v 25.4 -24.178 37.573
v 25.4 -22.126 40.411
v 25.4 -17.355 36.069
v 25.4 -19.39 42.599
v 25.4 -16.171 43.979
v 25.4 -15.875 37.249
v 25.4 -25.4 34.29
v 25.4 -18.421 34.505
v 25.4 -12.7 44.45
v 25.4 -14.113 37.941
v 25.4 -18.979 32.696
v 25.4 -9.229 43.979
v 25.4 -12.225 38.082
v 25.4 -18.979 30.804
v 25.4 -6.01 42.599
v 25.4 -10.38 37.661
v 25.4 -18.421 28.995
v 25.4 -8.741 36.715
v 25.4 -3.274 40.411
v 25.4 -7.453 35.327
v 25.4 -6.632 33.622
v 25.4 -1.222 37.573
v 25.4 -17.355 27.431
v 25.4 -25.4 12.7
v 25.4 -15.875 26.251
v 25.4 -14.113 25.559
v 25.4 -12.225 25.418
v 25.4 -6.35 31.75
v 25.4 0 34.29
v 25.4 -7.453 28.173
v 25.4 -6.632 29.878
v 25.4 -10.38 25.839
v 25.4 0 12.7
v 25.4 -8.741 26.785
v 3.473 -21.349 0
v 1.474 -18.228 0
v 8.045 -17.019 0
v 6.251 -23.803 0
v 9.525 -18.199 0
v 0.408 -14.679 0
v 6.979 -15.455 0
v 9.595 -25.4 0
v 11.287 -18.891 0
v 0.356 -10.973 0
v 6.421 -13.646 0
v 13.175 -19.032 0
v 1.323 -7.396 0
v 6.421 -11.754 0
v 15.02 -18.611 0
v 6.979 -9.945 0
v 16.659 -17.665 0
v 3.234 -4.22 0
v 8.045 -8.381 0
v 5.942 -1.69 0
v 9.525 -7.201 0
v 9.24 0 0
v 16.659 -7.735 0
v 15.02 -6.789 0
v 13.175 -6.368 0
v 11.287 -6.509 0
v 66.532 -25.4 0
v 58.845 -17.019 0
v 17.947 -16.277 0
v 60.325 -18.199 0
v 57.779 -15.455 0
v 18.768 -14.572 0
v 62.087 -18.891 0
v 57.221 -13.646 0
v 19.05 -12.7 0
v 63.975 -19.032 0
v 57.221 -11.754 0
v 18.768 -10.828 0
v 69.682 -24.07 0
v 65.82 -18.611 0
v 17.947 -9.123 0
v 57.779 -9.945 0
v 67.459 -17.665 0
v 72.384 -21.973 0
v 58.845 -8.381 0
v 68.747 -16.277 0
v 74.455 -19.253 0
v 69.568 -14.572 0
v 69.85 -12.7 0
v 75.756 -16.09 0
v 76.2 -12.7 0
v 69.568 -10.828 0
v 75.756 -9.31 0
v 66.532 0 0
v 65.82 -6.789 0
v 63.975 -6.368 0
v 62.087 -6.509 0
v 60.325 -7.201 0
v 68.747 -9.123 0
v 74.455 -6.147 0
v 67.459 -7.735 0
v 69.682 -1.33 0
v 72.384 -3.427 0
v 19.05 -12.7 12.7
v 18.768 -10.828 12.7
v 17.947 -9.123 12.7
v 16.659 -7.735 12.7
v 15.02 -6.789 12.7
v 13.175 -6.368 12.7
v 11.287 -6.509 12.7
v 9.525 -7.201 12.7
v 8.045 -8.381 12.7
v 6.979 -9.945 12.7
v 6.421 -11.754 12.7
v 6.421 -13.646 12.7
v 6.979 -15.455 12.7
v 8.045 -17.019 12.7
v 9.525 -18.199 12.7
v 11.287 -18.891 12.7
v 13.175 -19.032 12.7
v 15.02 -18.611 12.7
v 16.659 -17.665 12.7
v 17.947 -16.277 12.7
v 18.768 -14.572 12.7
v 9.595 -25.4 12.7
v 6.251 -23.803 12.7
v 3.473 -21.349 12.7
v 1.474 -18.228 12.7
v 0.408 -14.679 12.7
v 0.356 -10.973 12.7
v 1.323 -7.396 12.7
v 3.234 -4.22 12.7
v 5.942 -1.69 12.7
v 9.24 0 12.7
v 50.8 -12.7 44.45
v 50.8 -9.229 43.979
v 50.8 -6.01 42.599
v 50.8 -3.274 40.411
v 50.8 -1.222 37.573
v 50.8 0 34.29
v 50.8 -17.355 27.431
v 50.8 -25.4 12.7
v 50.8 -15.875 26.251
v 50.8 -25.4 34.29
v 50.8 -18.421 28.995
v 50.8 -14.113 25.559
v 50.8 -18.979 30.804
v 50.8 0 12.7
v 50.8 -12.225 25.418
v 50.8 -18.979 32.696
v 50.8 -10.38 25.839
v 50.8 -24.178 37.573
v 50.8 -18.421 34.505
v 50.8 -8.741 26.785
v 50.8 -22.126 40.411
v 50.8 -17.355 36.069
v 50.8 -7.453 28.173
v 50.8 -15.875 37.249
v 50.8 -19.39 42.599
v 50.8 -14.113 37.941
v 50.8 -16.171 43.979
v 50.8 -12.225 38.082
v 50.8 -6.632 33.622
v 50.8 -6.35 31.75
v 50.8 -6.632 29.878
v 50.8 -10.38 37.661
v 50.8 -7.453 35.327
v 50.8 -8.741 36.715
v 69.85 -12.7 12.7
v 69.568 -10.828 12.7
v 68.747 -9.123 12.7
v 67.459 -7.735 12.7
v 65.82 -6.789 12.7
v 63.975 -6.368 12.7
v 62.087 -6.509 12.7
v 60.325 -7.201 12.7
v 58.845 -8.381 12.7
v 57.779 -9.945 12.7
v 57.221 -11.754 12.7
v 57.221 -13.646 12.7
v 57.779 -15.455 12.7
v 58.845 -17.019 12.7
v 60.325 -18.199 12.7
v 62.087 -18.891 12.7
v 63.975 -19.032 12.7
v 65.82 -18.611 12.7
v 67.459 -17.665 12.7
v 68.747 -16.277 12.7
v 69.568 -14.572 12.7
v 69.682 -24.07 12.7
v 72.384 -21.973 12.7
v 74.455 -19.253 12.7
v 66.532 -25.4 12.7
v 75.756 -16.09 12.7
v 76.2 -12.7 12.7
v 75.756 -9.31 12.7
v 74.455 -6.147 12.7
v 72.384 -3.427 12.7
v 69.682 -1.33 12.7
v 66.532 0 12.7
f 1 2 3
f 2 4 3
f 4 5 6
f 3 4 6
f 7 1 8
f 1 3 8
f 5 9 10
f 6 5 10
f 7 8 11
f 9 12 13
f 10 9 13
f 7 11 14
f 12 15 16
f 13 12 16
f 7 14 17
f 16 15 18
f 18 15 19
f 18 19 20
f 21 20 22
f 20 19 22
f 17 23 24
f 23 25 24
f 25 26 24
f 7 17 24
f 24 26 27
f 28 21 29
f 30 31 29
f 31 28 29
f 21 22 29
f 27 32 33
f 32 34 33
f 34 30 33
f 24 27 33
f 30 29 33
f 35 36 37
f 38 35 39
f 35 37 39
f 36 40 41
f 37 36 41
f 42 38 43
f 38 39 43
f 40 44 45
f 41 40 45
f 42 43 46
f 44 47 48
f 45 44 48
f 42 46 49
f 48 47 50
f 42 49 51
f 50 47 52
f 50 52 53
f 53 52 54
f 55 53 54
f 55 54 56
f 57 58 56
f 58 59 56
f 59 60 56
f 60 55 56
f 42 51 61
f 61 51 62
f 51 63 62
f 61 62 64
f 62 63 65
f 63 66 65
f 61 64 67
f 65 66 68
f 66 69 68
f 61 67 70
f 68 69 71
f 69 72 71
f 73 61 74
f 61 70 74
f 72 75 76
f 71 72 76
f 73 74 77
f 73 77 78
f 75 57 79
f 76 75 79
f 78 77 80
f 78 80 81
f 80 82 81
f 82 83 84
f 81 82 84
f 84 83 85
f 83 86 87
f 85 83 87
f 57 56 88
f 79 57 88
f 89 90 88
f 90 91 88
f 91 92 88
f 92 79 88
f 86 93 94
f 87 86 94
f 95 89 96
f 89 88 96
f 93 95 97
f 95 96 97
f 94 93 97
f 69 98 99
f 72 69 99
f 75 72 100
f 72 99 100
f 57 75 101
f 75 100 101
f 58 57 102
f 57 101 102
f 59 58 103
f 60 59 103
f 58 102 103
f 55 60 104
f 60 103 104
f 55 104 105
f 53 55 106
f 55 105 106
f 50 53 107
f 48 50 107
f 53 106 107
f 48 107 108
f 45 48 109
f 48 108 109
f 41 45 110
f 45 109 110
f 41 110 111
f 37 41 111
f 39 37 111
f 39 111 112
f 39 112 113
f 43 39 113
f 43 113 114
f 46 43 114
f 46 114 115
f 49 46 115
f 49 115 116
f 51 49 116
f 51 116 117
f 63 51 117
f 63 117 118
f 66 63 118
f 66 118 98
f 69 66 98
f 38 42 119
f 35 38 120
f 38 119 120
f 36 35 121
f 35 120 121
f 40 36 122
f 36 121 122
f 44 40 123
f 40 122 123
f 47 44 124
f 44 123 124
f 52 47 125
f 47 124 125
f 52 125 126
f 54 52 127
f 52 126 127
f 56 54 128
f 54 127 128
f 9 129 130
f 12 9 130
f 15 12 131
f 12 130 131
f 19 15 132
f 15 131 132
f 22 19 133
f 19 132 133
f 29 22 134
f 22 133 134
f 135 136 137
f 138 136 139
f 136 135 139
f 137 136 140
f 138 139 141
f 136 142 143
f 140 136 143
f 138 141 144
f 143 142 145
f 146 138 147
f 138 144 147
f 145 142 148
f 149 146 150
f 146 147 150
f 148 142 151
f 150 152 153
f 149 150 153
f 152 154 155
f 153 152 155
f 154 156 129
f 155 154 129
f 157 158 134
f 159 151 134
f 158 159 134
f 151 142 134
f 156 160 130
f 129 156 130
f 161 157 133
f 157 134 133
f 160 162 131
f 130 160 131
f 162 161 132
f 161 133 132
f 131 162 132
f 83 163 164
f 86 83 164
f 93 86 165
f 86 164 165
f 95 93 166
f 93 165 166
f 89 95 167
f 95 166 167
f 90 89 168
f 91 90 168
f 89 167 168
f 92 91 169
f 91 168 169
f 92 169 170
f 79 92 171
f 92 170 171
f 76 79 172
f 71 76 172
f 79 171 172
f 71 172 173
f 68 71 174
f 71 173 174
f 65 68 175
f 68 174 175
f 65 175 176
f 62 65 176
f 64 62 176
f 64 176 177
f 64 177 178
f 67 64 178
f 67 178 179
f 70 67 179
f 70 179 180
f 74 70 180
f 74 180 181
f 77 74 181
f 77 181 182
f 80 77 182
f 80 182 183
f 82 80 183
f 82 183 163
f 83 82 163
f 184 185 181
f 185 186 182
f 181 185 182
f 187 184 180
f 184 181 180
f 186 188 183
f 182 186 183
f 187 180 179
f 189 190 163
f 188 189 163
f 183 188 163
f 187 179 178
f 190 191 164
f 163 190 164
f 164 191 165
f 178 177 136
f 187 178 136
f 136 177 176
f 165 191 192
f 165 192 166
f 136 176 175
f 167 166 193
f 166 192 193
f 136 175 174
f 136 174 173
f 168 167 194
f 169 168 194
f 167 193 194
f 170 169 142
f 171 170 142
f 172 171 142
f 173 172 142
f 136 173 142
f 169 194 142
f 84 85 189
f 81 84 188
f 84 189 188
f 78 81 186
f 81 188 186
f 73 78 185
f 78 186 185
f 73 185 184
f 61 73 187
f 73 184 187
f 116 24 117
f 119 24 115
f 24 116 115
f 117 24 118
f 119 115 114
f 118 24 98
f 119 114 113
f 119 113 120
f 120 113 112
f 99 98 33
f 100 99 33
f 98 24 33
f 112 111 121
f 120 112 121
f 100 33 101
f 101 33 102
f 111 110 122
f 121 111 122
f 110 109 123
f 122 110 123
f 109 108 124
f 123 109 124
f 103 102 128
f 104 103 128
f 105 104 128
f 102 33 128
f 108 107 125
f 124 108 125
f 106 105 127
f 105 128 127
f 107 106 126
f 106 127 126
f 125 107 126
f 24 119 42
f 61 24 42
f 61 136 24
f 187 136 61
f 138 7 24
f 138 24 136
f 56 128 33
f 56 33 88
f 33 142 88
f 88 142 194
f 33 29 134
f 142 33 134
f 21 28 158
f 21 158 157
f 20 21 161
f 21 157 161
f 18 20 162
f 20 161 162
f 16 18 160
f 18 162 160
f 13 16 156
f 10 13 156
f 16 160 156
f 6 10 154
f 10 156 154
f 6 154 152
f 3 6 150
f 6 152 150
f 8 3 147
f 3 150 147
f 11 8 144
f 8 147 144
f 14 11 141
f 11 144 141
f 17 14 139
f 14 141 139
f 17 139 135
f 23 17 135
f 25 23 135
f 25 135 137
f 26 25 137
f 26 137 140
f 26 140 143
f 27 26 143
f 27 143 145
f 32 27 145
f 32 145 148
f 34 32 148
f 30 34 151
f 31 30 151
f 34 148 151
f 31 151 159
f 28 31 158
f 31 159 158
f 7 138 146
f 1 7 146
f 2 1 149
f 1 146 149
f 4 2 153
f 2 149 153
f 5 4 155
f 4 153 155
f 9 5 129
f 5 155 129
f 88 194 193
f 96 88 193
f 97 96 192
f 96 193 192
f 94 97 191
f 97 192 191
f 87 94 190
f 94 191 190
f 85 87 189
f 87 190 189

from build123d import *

# Parameters (mm, degrees)
F1_DEPTH  = 25.4
F2_R      = 6.35
F3_DEPTH  = 25.4
F5_DEPTH  = 25.4
F6_R      = 6.35
F7_DEPTH  = 25.4
F8_R      = 6.35
F9_DEPTH  = 25.4
F11_DEPTH = 25.4
F13_DEPTH = 25.4


with BuildPart() as f1:
    # F0 (on Front) → F1 (new body)
    with BuildSketch(Plane.XZ):
        Polygon((0, 12.7), (0, 0), (76.2, 0), (76.2, 12.7), (50.8, 12.7), (50.8, 44.45), (25.4, 44.45), (25.4, 12.7), align=None)
    extrude(amount=F1_DEPTH)

    # F2 (on face) → F3 (cut)
    with BuildSketch(Plane.YZ.offset(50.8)):
        with Locations((-12.7, 31.75)):
            Circle(F2_R)
    extrude(amount=-F3_DEPTH, mode=Mode.SUBTRACT)

    # F4 (on face) → F5 (cut)
    with BuildSketch(Plane.YZ.offset(50.8)):
        with BuildLine():
            ThreePointArc((-25.4, 34.29), (-20.8319677815, 41.5974597269), (-12.7, 44.45))
            Line((-12.7, 44.45), (-25.4, 44.45))
            Line((-25.4, 44.45), (-25.4, 34.29))
        make_face()
        with BuildLine():
            ThreePointArc((-12.7, 44.45), (-4.5680322185, 41.5974597269), (0, 34.29))
            Line((0, 34.29), (0, 44.45))
            Line((0, 44.45), (-12.7, 44.45))
        make_face()
    extrude(amount=-F5_DEPTH, mode=Mode.SUBTRACT)

    # F6 (on face) → F7 (cut)
    with BuildSketch(Plane.XY.offset(12.7)):
        with Locations((63.5, -12.7)):
            Circle(F6_R)
    extrude(amount=-F7_DEPTH, mode=Mode.SUBTRACT)

    # F8 (on face) → F9 (cut)
    with BuildSketch(Plane.XY.offset(12.7)):
        with Locations((12.7, -12.7)):
            Circle(F8_R)
    extrude(amount=-F9_DEPTH, mode=Mode.SUBTRACT)

    # F10 (on face) → F11 (cut)
    with BuildSketch(Plane.XY.offset(12.7)):
        with BuildLine():
            ThreePointArc((66.5324394711, 0), (73.5081244057, -4.719528106), (76.2, -12.6999999989))
            Line((76.2, -12.6999999989), (76.2, 0))
            Line((76.2, 0), (66.5324394711, 0))
        make_face()
        with BuildLine():
            ThreePointArc((76.2, -12.6999999989), (73.5081244064, -20.6804718932), (66.5324394711, -25.4))
            Line((66.5324394711, -25.4), (76.2, -25.4))
            Line((76.2, -25.4), (76.2, -12.6999999989))
        make_face()
    extrude(amount=-F11_DEPTH, mode=Mode.SUBTRACT)

    # F12 (on face) → F13 (cut)
    with BuildSketch(Plane.XY.offset(12.7)):
        with BuildLine():
            ThreePointArc((9.5950094983, -25.4), (0.2534522323, -12.8279951022), (9.240250381, 0))
            Line((9.240250381, 0), (0, 0))
            Line((0, 0), (0, -25.4))
            Line((0, -25.4), (9.5950094983, -25.4))
        make_face()
    extrude(amount=-F13_DEPTH, mode=Mode.SUBTRACT)


solid = f1.part
